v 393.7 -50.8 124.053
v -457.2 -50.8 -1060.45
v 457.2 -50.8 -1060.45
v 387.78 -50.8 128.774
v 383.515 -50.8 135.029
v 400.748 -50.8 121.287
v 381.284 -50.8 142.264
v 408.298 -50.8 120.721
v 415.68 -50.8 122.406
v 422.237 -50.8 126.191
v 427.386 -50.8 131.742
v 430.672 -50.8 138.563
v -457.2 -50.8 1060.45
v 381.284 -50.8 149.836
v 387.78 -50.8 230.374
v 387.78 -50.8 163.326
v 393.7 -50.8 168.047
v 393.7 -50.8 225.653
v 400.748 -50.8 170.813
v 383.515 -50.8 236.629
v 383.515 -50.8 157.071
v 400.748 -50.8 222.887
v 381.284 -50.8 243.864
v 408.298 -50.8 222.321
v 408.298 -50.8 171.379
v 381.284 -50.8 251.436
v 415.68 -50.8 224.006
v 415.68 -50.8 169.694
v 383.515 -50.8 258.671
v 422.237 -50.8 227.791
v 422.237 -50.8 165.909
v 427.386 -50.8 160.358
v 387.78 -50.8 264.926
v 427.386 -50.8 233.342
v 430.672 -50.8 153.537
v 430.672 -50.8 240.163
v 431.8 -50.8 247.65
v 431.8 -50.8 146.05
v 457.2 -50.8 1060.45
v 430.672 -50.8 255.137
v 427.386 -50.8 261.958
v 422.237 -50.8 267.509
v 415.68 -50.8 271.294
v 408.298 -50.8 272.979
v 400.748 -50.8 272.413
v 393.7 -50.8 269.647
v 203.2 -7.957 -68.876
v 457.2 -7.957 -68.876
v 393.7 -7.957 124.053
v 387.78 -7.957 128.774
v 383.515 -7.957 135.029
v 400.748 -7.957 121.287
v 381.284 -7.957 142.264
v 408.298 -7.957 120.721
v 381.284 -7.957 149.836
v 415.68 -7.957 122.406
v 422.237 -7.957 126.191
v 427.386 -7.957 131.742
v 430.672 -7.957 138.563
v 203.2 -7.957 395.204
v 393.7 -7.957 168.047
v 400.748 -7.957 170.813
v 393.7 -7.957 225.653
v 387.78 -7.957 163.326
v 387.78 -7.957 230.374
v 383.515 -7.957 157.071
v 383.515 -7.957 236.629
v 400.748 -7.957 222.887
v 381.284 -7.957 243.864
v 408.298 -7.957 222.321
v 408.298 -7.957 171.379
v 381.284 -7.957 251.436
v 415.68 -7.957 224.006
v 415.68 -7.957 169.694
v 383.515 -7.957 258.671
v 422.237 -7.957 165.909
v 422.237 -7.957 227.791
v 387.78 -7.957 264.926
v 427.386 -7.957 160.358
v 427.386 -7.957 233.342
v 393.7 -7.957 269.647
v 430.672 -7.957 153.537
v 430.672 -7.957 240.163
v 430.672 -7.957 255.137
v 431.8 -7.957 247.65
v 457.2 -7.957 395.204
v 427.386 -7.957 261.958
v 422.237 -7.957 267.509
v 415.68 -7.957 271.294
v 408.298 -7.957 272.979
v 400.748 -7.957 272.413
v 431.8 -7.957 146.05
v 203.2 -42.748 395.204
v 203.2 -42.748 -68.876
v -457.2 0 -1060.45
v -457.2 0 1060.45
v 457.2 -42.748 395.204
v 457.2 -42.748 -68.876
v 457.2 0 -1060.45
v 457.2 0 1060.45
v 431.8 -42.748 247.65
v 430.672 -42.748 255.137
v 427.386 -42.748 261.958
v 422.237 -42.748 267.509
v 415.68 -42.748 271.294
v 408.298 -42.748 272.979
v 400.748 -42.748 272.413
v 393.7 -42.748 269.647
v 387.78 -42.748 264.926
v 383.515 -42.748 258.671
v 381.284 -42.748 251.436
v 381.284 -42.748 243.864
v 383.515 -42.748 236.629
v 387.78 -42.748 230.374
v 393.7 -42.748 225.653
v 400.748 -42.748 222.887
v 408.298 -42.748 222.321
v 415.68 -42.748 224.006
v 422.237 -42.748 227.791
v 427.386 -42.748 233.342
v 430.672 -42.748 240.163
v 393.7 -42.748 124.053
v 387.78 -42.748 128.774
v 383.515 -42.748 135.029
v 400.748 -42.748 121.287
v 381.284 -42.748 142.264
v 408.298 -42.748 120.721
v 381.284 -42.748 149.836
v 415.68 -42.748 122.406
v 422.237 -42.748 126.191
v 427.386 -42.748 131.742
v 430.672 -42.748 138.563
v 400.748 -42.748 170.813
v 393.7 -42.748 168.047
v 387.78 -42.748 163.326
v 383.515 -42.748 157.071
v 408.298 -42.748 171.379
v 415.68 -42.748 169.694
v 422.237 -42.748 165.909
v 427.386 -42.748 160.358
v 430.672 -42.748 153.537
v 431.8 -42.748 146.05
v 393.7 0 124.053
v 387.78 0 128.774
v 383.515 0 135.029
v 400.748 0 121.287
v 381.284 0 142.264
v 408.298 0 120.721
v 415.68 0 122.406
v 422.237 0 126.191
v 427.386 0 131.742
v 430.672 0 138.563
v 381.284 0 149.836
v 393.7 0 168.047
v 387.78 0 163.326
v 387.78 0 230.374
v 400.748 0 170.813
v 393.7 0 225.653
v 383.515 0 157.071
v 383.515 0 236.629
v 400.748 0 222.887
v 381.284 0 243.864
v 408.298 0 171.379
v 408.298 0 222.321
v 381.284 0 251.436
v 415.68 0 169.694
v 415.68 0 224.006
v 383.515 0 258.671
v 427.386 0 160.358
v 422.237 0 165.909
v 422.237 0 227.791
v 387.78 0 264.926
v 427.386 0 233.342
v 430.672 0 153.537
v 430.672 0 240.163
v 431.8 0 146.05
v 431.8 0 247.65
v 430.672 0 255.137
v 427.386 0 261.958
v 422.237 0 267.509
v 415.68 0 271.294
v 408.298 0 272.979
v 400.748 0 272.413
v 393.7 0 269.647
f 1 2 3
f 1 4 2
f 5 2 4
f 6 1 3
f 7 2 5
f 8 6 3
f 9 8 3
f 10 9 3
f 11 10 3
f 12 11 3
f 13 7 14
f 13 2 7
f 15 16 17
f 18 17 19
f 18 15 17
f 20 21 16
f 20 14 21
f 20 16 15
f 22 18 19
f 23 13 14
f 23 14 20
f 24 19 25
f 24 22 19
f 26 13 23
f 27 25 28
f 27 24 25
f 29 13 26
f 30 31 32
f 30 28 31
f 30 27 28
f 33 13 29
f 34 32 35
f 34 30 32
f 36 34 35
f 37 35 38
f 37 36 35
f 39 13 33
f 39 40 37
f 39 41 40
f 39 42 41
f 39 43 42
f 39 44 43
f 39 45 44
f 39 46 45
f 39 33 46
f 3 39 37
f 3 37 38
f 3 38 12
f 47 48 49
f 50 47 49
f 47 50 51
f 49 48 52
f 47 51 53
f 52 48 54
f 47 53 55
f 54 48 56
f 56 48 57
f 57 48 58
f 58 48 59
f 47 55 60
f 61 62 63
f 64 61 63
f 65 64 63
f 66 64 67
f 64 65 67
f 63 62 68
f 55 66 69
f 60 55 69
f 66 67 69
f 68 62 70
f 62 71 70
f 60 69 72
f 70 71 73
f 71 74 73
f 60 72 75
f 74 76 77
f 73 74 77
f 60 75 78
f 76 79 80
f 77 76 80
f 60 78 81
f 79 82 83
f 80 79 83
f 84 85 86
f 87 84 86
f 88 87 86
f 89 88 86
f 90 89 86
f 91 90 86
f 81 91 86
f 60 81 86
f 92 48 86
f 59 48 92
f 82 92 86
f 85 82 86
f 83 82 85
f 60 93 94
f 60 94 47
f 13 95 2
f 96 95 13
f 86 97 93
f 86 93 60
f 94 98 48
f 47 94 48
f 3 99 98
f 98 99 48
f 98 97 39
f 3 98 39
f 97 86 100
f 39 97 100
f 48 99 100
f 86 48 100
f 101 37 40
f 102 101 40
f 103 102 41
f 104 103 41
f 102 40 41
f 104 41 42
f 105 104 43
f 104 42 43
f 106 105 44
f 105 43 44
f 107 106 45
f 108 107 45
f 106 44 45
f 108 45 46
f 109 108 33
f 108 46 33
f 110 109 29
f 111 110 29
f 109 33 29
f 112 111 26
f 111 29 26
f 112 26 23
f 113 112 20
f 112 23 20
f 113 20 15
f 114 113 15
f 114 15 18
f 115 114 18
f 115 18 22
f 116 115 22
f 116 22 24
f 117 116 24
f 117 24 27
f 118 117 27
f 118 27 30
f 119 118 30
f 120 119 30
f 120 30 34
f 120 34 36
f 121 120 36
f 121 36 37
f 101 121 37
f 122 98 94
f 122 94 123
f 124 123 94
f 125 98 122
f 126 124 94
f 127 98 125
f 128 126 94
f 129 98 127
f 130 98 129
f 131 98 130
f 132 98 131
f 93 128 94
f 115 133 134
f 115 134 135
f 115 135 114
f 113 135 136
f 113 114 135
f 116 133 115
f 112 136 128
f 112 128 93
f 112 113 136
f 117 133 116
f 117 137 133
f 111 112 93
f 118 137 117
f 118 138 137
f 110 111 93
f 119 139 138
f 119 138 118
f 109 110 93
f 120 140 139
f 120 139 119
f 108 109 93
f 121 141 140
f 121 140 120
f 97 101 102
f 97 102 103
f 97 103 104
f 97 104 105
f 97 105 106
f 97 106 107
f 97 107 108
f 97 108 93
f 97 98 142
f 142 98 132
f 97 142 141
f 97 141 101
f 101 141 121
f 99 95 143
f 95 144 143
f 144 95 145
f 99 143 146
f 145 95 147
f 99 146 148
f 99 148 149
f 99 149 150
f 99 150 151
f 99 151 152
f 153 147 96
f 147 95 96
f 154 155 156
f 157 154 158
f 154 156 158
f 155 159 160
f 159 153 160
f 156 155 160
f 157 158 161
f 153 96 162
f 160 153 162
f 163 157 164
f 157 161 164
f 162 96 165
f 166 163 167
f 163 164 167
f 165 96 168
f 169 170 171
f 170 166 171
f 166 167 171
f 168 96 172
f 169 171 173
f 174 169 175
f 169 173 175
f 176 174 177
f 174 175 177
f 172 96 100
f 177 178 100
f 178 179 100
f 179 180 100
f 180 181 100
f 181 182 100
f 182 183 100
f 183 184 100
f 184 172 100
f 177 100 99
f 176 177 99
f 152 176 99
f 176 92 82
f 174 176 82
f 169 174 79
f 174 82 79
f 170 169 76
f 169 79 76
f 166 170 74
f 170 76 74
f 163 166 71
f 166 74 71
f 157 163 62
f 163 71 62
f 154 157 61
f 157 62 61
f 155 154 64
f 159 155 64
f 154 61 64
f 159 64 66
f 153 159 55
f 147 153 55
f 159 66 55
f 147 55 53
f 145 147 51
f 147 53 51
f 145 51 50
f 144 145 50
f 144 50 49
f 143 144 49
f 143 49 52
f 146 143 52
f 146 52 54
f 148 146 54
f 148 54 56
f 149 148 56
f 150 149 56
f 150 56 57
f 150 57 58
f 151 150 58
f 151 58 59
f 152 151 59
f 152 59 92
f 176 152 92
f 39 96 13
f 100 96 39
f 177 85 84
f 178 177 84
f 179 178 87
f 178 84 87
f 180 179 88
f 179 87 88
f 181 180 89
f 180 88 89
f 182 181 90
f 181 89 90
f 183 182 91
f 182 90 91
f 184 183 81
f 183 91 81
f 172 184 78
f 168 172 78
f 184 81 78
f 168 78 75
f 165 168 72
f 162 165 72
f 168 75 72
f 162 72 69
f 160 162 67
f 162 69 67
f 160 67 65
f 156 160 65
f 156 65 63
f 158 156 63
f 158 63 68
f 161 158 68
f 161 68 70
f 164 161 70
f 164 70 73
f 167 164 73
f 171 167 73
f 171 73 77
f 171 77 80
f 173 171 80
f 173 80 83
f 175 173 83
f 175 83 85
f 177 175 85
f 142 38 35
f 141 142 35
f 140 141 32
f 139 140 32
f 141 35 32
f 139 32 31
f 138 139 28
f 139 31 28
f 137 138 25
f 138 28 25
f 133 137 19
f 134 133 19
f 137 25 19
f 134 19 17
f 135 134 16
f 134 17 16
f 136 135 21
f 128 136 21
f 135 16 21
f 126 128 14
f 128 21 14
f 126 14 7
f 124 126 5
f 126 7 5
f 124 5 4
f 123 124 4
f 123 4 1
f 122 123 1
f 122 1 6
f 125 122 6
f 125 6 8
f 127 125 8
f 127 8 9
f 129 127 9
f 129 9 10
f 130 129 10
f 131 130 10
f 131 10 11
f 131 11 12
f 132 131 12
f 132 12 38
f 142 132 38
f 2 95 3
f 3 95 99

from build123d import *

# Parameters (mm, degrees)
F0_W     = 914.4
F0_H     = 2120.9
F1_DEPTH = 50.8
F2_R     = 25.4
F3_DEPTH = 50.801
F4_W     = 34.790657
F4_H     = 464.079693
F5_DEPTH = 254


with BuildPart() as f1:
    # F0 (on Front) → F1 (new body)
    with BuildSketch(Plane.XZ):
        Rectangle(F0_W, F0_H)
    extrude(amount=F1_DEPTH)

    # F2 (on face) → F3 (cut, through all)
    with BuildSketch(Plane.XZ.offset(50.8)):
        with Locations((406.4, 247.65)):
            Circle(F2_R)
        with Locations((406.4, 146.05)):
            Circle(F2_R)
    extrude(amount=-F3_DEPTH, mode=Mode.SUBTRACT)

    # F4 (on face) → F5 (cut)
    with BuildSketch(Plane.YZ.offset(457.2)):
        with Locations((-25.352478, 163.164123)):
            Rectangle(F4_W, F4_H)
    extrude(amount=-F5_DEPTH, mode=Mode.SUBTRACT)


solid = f1.part
